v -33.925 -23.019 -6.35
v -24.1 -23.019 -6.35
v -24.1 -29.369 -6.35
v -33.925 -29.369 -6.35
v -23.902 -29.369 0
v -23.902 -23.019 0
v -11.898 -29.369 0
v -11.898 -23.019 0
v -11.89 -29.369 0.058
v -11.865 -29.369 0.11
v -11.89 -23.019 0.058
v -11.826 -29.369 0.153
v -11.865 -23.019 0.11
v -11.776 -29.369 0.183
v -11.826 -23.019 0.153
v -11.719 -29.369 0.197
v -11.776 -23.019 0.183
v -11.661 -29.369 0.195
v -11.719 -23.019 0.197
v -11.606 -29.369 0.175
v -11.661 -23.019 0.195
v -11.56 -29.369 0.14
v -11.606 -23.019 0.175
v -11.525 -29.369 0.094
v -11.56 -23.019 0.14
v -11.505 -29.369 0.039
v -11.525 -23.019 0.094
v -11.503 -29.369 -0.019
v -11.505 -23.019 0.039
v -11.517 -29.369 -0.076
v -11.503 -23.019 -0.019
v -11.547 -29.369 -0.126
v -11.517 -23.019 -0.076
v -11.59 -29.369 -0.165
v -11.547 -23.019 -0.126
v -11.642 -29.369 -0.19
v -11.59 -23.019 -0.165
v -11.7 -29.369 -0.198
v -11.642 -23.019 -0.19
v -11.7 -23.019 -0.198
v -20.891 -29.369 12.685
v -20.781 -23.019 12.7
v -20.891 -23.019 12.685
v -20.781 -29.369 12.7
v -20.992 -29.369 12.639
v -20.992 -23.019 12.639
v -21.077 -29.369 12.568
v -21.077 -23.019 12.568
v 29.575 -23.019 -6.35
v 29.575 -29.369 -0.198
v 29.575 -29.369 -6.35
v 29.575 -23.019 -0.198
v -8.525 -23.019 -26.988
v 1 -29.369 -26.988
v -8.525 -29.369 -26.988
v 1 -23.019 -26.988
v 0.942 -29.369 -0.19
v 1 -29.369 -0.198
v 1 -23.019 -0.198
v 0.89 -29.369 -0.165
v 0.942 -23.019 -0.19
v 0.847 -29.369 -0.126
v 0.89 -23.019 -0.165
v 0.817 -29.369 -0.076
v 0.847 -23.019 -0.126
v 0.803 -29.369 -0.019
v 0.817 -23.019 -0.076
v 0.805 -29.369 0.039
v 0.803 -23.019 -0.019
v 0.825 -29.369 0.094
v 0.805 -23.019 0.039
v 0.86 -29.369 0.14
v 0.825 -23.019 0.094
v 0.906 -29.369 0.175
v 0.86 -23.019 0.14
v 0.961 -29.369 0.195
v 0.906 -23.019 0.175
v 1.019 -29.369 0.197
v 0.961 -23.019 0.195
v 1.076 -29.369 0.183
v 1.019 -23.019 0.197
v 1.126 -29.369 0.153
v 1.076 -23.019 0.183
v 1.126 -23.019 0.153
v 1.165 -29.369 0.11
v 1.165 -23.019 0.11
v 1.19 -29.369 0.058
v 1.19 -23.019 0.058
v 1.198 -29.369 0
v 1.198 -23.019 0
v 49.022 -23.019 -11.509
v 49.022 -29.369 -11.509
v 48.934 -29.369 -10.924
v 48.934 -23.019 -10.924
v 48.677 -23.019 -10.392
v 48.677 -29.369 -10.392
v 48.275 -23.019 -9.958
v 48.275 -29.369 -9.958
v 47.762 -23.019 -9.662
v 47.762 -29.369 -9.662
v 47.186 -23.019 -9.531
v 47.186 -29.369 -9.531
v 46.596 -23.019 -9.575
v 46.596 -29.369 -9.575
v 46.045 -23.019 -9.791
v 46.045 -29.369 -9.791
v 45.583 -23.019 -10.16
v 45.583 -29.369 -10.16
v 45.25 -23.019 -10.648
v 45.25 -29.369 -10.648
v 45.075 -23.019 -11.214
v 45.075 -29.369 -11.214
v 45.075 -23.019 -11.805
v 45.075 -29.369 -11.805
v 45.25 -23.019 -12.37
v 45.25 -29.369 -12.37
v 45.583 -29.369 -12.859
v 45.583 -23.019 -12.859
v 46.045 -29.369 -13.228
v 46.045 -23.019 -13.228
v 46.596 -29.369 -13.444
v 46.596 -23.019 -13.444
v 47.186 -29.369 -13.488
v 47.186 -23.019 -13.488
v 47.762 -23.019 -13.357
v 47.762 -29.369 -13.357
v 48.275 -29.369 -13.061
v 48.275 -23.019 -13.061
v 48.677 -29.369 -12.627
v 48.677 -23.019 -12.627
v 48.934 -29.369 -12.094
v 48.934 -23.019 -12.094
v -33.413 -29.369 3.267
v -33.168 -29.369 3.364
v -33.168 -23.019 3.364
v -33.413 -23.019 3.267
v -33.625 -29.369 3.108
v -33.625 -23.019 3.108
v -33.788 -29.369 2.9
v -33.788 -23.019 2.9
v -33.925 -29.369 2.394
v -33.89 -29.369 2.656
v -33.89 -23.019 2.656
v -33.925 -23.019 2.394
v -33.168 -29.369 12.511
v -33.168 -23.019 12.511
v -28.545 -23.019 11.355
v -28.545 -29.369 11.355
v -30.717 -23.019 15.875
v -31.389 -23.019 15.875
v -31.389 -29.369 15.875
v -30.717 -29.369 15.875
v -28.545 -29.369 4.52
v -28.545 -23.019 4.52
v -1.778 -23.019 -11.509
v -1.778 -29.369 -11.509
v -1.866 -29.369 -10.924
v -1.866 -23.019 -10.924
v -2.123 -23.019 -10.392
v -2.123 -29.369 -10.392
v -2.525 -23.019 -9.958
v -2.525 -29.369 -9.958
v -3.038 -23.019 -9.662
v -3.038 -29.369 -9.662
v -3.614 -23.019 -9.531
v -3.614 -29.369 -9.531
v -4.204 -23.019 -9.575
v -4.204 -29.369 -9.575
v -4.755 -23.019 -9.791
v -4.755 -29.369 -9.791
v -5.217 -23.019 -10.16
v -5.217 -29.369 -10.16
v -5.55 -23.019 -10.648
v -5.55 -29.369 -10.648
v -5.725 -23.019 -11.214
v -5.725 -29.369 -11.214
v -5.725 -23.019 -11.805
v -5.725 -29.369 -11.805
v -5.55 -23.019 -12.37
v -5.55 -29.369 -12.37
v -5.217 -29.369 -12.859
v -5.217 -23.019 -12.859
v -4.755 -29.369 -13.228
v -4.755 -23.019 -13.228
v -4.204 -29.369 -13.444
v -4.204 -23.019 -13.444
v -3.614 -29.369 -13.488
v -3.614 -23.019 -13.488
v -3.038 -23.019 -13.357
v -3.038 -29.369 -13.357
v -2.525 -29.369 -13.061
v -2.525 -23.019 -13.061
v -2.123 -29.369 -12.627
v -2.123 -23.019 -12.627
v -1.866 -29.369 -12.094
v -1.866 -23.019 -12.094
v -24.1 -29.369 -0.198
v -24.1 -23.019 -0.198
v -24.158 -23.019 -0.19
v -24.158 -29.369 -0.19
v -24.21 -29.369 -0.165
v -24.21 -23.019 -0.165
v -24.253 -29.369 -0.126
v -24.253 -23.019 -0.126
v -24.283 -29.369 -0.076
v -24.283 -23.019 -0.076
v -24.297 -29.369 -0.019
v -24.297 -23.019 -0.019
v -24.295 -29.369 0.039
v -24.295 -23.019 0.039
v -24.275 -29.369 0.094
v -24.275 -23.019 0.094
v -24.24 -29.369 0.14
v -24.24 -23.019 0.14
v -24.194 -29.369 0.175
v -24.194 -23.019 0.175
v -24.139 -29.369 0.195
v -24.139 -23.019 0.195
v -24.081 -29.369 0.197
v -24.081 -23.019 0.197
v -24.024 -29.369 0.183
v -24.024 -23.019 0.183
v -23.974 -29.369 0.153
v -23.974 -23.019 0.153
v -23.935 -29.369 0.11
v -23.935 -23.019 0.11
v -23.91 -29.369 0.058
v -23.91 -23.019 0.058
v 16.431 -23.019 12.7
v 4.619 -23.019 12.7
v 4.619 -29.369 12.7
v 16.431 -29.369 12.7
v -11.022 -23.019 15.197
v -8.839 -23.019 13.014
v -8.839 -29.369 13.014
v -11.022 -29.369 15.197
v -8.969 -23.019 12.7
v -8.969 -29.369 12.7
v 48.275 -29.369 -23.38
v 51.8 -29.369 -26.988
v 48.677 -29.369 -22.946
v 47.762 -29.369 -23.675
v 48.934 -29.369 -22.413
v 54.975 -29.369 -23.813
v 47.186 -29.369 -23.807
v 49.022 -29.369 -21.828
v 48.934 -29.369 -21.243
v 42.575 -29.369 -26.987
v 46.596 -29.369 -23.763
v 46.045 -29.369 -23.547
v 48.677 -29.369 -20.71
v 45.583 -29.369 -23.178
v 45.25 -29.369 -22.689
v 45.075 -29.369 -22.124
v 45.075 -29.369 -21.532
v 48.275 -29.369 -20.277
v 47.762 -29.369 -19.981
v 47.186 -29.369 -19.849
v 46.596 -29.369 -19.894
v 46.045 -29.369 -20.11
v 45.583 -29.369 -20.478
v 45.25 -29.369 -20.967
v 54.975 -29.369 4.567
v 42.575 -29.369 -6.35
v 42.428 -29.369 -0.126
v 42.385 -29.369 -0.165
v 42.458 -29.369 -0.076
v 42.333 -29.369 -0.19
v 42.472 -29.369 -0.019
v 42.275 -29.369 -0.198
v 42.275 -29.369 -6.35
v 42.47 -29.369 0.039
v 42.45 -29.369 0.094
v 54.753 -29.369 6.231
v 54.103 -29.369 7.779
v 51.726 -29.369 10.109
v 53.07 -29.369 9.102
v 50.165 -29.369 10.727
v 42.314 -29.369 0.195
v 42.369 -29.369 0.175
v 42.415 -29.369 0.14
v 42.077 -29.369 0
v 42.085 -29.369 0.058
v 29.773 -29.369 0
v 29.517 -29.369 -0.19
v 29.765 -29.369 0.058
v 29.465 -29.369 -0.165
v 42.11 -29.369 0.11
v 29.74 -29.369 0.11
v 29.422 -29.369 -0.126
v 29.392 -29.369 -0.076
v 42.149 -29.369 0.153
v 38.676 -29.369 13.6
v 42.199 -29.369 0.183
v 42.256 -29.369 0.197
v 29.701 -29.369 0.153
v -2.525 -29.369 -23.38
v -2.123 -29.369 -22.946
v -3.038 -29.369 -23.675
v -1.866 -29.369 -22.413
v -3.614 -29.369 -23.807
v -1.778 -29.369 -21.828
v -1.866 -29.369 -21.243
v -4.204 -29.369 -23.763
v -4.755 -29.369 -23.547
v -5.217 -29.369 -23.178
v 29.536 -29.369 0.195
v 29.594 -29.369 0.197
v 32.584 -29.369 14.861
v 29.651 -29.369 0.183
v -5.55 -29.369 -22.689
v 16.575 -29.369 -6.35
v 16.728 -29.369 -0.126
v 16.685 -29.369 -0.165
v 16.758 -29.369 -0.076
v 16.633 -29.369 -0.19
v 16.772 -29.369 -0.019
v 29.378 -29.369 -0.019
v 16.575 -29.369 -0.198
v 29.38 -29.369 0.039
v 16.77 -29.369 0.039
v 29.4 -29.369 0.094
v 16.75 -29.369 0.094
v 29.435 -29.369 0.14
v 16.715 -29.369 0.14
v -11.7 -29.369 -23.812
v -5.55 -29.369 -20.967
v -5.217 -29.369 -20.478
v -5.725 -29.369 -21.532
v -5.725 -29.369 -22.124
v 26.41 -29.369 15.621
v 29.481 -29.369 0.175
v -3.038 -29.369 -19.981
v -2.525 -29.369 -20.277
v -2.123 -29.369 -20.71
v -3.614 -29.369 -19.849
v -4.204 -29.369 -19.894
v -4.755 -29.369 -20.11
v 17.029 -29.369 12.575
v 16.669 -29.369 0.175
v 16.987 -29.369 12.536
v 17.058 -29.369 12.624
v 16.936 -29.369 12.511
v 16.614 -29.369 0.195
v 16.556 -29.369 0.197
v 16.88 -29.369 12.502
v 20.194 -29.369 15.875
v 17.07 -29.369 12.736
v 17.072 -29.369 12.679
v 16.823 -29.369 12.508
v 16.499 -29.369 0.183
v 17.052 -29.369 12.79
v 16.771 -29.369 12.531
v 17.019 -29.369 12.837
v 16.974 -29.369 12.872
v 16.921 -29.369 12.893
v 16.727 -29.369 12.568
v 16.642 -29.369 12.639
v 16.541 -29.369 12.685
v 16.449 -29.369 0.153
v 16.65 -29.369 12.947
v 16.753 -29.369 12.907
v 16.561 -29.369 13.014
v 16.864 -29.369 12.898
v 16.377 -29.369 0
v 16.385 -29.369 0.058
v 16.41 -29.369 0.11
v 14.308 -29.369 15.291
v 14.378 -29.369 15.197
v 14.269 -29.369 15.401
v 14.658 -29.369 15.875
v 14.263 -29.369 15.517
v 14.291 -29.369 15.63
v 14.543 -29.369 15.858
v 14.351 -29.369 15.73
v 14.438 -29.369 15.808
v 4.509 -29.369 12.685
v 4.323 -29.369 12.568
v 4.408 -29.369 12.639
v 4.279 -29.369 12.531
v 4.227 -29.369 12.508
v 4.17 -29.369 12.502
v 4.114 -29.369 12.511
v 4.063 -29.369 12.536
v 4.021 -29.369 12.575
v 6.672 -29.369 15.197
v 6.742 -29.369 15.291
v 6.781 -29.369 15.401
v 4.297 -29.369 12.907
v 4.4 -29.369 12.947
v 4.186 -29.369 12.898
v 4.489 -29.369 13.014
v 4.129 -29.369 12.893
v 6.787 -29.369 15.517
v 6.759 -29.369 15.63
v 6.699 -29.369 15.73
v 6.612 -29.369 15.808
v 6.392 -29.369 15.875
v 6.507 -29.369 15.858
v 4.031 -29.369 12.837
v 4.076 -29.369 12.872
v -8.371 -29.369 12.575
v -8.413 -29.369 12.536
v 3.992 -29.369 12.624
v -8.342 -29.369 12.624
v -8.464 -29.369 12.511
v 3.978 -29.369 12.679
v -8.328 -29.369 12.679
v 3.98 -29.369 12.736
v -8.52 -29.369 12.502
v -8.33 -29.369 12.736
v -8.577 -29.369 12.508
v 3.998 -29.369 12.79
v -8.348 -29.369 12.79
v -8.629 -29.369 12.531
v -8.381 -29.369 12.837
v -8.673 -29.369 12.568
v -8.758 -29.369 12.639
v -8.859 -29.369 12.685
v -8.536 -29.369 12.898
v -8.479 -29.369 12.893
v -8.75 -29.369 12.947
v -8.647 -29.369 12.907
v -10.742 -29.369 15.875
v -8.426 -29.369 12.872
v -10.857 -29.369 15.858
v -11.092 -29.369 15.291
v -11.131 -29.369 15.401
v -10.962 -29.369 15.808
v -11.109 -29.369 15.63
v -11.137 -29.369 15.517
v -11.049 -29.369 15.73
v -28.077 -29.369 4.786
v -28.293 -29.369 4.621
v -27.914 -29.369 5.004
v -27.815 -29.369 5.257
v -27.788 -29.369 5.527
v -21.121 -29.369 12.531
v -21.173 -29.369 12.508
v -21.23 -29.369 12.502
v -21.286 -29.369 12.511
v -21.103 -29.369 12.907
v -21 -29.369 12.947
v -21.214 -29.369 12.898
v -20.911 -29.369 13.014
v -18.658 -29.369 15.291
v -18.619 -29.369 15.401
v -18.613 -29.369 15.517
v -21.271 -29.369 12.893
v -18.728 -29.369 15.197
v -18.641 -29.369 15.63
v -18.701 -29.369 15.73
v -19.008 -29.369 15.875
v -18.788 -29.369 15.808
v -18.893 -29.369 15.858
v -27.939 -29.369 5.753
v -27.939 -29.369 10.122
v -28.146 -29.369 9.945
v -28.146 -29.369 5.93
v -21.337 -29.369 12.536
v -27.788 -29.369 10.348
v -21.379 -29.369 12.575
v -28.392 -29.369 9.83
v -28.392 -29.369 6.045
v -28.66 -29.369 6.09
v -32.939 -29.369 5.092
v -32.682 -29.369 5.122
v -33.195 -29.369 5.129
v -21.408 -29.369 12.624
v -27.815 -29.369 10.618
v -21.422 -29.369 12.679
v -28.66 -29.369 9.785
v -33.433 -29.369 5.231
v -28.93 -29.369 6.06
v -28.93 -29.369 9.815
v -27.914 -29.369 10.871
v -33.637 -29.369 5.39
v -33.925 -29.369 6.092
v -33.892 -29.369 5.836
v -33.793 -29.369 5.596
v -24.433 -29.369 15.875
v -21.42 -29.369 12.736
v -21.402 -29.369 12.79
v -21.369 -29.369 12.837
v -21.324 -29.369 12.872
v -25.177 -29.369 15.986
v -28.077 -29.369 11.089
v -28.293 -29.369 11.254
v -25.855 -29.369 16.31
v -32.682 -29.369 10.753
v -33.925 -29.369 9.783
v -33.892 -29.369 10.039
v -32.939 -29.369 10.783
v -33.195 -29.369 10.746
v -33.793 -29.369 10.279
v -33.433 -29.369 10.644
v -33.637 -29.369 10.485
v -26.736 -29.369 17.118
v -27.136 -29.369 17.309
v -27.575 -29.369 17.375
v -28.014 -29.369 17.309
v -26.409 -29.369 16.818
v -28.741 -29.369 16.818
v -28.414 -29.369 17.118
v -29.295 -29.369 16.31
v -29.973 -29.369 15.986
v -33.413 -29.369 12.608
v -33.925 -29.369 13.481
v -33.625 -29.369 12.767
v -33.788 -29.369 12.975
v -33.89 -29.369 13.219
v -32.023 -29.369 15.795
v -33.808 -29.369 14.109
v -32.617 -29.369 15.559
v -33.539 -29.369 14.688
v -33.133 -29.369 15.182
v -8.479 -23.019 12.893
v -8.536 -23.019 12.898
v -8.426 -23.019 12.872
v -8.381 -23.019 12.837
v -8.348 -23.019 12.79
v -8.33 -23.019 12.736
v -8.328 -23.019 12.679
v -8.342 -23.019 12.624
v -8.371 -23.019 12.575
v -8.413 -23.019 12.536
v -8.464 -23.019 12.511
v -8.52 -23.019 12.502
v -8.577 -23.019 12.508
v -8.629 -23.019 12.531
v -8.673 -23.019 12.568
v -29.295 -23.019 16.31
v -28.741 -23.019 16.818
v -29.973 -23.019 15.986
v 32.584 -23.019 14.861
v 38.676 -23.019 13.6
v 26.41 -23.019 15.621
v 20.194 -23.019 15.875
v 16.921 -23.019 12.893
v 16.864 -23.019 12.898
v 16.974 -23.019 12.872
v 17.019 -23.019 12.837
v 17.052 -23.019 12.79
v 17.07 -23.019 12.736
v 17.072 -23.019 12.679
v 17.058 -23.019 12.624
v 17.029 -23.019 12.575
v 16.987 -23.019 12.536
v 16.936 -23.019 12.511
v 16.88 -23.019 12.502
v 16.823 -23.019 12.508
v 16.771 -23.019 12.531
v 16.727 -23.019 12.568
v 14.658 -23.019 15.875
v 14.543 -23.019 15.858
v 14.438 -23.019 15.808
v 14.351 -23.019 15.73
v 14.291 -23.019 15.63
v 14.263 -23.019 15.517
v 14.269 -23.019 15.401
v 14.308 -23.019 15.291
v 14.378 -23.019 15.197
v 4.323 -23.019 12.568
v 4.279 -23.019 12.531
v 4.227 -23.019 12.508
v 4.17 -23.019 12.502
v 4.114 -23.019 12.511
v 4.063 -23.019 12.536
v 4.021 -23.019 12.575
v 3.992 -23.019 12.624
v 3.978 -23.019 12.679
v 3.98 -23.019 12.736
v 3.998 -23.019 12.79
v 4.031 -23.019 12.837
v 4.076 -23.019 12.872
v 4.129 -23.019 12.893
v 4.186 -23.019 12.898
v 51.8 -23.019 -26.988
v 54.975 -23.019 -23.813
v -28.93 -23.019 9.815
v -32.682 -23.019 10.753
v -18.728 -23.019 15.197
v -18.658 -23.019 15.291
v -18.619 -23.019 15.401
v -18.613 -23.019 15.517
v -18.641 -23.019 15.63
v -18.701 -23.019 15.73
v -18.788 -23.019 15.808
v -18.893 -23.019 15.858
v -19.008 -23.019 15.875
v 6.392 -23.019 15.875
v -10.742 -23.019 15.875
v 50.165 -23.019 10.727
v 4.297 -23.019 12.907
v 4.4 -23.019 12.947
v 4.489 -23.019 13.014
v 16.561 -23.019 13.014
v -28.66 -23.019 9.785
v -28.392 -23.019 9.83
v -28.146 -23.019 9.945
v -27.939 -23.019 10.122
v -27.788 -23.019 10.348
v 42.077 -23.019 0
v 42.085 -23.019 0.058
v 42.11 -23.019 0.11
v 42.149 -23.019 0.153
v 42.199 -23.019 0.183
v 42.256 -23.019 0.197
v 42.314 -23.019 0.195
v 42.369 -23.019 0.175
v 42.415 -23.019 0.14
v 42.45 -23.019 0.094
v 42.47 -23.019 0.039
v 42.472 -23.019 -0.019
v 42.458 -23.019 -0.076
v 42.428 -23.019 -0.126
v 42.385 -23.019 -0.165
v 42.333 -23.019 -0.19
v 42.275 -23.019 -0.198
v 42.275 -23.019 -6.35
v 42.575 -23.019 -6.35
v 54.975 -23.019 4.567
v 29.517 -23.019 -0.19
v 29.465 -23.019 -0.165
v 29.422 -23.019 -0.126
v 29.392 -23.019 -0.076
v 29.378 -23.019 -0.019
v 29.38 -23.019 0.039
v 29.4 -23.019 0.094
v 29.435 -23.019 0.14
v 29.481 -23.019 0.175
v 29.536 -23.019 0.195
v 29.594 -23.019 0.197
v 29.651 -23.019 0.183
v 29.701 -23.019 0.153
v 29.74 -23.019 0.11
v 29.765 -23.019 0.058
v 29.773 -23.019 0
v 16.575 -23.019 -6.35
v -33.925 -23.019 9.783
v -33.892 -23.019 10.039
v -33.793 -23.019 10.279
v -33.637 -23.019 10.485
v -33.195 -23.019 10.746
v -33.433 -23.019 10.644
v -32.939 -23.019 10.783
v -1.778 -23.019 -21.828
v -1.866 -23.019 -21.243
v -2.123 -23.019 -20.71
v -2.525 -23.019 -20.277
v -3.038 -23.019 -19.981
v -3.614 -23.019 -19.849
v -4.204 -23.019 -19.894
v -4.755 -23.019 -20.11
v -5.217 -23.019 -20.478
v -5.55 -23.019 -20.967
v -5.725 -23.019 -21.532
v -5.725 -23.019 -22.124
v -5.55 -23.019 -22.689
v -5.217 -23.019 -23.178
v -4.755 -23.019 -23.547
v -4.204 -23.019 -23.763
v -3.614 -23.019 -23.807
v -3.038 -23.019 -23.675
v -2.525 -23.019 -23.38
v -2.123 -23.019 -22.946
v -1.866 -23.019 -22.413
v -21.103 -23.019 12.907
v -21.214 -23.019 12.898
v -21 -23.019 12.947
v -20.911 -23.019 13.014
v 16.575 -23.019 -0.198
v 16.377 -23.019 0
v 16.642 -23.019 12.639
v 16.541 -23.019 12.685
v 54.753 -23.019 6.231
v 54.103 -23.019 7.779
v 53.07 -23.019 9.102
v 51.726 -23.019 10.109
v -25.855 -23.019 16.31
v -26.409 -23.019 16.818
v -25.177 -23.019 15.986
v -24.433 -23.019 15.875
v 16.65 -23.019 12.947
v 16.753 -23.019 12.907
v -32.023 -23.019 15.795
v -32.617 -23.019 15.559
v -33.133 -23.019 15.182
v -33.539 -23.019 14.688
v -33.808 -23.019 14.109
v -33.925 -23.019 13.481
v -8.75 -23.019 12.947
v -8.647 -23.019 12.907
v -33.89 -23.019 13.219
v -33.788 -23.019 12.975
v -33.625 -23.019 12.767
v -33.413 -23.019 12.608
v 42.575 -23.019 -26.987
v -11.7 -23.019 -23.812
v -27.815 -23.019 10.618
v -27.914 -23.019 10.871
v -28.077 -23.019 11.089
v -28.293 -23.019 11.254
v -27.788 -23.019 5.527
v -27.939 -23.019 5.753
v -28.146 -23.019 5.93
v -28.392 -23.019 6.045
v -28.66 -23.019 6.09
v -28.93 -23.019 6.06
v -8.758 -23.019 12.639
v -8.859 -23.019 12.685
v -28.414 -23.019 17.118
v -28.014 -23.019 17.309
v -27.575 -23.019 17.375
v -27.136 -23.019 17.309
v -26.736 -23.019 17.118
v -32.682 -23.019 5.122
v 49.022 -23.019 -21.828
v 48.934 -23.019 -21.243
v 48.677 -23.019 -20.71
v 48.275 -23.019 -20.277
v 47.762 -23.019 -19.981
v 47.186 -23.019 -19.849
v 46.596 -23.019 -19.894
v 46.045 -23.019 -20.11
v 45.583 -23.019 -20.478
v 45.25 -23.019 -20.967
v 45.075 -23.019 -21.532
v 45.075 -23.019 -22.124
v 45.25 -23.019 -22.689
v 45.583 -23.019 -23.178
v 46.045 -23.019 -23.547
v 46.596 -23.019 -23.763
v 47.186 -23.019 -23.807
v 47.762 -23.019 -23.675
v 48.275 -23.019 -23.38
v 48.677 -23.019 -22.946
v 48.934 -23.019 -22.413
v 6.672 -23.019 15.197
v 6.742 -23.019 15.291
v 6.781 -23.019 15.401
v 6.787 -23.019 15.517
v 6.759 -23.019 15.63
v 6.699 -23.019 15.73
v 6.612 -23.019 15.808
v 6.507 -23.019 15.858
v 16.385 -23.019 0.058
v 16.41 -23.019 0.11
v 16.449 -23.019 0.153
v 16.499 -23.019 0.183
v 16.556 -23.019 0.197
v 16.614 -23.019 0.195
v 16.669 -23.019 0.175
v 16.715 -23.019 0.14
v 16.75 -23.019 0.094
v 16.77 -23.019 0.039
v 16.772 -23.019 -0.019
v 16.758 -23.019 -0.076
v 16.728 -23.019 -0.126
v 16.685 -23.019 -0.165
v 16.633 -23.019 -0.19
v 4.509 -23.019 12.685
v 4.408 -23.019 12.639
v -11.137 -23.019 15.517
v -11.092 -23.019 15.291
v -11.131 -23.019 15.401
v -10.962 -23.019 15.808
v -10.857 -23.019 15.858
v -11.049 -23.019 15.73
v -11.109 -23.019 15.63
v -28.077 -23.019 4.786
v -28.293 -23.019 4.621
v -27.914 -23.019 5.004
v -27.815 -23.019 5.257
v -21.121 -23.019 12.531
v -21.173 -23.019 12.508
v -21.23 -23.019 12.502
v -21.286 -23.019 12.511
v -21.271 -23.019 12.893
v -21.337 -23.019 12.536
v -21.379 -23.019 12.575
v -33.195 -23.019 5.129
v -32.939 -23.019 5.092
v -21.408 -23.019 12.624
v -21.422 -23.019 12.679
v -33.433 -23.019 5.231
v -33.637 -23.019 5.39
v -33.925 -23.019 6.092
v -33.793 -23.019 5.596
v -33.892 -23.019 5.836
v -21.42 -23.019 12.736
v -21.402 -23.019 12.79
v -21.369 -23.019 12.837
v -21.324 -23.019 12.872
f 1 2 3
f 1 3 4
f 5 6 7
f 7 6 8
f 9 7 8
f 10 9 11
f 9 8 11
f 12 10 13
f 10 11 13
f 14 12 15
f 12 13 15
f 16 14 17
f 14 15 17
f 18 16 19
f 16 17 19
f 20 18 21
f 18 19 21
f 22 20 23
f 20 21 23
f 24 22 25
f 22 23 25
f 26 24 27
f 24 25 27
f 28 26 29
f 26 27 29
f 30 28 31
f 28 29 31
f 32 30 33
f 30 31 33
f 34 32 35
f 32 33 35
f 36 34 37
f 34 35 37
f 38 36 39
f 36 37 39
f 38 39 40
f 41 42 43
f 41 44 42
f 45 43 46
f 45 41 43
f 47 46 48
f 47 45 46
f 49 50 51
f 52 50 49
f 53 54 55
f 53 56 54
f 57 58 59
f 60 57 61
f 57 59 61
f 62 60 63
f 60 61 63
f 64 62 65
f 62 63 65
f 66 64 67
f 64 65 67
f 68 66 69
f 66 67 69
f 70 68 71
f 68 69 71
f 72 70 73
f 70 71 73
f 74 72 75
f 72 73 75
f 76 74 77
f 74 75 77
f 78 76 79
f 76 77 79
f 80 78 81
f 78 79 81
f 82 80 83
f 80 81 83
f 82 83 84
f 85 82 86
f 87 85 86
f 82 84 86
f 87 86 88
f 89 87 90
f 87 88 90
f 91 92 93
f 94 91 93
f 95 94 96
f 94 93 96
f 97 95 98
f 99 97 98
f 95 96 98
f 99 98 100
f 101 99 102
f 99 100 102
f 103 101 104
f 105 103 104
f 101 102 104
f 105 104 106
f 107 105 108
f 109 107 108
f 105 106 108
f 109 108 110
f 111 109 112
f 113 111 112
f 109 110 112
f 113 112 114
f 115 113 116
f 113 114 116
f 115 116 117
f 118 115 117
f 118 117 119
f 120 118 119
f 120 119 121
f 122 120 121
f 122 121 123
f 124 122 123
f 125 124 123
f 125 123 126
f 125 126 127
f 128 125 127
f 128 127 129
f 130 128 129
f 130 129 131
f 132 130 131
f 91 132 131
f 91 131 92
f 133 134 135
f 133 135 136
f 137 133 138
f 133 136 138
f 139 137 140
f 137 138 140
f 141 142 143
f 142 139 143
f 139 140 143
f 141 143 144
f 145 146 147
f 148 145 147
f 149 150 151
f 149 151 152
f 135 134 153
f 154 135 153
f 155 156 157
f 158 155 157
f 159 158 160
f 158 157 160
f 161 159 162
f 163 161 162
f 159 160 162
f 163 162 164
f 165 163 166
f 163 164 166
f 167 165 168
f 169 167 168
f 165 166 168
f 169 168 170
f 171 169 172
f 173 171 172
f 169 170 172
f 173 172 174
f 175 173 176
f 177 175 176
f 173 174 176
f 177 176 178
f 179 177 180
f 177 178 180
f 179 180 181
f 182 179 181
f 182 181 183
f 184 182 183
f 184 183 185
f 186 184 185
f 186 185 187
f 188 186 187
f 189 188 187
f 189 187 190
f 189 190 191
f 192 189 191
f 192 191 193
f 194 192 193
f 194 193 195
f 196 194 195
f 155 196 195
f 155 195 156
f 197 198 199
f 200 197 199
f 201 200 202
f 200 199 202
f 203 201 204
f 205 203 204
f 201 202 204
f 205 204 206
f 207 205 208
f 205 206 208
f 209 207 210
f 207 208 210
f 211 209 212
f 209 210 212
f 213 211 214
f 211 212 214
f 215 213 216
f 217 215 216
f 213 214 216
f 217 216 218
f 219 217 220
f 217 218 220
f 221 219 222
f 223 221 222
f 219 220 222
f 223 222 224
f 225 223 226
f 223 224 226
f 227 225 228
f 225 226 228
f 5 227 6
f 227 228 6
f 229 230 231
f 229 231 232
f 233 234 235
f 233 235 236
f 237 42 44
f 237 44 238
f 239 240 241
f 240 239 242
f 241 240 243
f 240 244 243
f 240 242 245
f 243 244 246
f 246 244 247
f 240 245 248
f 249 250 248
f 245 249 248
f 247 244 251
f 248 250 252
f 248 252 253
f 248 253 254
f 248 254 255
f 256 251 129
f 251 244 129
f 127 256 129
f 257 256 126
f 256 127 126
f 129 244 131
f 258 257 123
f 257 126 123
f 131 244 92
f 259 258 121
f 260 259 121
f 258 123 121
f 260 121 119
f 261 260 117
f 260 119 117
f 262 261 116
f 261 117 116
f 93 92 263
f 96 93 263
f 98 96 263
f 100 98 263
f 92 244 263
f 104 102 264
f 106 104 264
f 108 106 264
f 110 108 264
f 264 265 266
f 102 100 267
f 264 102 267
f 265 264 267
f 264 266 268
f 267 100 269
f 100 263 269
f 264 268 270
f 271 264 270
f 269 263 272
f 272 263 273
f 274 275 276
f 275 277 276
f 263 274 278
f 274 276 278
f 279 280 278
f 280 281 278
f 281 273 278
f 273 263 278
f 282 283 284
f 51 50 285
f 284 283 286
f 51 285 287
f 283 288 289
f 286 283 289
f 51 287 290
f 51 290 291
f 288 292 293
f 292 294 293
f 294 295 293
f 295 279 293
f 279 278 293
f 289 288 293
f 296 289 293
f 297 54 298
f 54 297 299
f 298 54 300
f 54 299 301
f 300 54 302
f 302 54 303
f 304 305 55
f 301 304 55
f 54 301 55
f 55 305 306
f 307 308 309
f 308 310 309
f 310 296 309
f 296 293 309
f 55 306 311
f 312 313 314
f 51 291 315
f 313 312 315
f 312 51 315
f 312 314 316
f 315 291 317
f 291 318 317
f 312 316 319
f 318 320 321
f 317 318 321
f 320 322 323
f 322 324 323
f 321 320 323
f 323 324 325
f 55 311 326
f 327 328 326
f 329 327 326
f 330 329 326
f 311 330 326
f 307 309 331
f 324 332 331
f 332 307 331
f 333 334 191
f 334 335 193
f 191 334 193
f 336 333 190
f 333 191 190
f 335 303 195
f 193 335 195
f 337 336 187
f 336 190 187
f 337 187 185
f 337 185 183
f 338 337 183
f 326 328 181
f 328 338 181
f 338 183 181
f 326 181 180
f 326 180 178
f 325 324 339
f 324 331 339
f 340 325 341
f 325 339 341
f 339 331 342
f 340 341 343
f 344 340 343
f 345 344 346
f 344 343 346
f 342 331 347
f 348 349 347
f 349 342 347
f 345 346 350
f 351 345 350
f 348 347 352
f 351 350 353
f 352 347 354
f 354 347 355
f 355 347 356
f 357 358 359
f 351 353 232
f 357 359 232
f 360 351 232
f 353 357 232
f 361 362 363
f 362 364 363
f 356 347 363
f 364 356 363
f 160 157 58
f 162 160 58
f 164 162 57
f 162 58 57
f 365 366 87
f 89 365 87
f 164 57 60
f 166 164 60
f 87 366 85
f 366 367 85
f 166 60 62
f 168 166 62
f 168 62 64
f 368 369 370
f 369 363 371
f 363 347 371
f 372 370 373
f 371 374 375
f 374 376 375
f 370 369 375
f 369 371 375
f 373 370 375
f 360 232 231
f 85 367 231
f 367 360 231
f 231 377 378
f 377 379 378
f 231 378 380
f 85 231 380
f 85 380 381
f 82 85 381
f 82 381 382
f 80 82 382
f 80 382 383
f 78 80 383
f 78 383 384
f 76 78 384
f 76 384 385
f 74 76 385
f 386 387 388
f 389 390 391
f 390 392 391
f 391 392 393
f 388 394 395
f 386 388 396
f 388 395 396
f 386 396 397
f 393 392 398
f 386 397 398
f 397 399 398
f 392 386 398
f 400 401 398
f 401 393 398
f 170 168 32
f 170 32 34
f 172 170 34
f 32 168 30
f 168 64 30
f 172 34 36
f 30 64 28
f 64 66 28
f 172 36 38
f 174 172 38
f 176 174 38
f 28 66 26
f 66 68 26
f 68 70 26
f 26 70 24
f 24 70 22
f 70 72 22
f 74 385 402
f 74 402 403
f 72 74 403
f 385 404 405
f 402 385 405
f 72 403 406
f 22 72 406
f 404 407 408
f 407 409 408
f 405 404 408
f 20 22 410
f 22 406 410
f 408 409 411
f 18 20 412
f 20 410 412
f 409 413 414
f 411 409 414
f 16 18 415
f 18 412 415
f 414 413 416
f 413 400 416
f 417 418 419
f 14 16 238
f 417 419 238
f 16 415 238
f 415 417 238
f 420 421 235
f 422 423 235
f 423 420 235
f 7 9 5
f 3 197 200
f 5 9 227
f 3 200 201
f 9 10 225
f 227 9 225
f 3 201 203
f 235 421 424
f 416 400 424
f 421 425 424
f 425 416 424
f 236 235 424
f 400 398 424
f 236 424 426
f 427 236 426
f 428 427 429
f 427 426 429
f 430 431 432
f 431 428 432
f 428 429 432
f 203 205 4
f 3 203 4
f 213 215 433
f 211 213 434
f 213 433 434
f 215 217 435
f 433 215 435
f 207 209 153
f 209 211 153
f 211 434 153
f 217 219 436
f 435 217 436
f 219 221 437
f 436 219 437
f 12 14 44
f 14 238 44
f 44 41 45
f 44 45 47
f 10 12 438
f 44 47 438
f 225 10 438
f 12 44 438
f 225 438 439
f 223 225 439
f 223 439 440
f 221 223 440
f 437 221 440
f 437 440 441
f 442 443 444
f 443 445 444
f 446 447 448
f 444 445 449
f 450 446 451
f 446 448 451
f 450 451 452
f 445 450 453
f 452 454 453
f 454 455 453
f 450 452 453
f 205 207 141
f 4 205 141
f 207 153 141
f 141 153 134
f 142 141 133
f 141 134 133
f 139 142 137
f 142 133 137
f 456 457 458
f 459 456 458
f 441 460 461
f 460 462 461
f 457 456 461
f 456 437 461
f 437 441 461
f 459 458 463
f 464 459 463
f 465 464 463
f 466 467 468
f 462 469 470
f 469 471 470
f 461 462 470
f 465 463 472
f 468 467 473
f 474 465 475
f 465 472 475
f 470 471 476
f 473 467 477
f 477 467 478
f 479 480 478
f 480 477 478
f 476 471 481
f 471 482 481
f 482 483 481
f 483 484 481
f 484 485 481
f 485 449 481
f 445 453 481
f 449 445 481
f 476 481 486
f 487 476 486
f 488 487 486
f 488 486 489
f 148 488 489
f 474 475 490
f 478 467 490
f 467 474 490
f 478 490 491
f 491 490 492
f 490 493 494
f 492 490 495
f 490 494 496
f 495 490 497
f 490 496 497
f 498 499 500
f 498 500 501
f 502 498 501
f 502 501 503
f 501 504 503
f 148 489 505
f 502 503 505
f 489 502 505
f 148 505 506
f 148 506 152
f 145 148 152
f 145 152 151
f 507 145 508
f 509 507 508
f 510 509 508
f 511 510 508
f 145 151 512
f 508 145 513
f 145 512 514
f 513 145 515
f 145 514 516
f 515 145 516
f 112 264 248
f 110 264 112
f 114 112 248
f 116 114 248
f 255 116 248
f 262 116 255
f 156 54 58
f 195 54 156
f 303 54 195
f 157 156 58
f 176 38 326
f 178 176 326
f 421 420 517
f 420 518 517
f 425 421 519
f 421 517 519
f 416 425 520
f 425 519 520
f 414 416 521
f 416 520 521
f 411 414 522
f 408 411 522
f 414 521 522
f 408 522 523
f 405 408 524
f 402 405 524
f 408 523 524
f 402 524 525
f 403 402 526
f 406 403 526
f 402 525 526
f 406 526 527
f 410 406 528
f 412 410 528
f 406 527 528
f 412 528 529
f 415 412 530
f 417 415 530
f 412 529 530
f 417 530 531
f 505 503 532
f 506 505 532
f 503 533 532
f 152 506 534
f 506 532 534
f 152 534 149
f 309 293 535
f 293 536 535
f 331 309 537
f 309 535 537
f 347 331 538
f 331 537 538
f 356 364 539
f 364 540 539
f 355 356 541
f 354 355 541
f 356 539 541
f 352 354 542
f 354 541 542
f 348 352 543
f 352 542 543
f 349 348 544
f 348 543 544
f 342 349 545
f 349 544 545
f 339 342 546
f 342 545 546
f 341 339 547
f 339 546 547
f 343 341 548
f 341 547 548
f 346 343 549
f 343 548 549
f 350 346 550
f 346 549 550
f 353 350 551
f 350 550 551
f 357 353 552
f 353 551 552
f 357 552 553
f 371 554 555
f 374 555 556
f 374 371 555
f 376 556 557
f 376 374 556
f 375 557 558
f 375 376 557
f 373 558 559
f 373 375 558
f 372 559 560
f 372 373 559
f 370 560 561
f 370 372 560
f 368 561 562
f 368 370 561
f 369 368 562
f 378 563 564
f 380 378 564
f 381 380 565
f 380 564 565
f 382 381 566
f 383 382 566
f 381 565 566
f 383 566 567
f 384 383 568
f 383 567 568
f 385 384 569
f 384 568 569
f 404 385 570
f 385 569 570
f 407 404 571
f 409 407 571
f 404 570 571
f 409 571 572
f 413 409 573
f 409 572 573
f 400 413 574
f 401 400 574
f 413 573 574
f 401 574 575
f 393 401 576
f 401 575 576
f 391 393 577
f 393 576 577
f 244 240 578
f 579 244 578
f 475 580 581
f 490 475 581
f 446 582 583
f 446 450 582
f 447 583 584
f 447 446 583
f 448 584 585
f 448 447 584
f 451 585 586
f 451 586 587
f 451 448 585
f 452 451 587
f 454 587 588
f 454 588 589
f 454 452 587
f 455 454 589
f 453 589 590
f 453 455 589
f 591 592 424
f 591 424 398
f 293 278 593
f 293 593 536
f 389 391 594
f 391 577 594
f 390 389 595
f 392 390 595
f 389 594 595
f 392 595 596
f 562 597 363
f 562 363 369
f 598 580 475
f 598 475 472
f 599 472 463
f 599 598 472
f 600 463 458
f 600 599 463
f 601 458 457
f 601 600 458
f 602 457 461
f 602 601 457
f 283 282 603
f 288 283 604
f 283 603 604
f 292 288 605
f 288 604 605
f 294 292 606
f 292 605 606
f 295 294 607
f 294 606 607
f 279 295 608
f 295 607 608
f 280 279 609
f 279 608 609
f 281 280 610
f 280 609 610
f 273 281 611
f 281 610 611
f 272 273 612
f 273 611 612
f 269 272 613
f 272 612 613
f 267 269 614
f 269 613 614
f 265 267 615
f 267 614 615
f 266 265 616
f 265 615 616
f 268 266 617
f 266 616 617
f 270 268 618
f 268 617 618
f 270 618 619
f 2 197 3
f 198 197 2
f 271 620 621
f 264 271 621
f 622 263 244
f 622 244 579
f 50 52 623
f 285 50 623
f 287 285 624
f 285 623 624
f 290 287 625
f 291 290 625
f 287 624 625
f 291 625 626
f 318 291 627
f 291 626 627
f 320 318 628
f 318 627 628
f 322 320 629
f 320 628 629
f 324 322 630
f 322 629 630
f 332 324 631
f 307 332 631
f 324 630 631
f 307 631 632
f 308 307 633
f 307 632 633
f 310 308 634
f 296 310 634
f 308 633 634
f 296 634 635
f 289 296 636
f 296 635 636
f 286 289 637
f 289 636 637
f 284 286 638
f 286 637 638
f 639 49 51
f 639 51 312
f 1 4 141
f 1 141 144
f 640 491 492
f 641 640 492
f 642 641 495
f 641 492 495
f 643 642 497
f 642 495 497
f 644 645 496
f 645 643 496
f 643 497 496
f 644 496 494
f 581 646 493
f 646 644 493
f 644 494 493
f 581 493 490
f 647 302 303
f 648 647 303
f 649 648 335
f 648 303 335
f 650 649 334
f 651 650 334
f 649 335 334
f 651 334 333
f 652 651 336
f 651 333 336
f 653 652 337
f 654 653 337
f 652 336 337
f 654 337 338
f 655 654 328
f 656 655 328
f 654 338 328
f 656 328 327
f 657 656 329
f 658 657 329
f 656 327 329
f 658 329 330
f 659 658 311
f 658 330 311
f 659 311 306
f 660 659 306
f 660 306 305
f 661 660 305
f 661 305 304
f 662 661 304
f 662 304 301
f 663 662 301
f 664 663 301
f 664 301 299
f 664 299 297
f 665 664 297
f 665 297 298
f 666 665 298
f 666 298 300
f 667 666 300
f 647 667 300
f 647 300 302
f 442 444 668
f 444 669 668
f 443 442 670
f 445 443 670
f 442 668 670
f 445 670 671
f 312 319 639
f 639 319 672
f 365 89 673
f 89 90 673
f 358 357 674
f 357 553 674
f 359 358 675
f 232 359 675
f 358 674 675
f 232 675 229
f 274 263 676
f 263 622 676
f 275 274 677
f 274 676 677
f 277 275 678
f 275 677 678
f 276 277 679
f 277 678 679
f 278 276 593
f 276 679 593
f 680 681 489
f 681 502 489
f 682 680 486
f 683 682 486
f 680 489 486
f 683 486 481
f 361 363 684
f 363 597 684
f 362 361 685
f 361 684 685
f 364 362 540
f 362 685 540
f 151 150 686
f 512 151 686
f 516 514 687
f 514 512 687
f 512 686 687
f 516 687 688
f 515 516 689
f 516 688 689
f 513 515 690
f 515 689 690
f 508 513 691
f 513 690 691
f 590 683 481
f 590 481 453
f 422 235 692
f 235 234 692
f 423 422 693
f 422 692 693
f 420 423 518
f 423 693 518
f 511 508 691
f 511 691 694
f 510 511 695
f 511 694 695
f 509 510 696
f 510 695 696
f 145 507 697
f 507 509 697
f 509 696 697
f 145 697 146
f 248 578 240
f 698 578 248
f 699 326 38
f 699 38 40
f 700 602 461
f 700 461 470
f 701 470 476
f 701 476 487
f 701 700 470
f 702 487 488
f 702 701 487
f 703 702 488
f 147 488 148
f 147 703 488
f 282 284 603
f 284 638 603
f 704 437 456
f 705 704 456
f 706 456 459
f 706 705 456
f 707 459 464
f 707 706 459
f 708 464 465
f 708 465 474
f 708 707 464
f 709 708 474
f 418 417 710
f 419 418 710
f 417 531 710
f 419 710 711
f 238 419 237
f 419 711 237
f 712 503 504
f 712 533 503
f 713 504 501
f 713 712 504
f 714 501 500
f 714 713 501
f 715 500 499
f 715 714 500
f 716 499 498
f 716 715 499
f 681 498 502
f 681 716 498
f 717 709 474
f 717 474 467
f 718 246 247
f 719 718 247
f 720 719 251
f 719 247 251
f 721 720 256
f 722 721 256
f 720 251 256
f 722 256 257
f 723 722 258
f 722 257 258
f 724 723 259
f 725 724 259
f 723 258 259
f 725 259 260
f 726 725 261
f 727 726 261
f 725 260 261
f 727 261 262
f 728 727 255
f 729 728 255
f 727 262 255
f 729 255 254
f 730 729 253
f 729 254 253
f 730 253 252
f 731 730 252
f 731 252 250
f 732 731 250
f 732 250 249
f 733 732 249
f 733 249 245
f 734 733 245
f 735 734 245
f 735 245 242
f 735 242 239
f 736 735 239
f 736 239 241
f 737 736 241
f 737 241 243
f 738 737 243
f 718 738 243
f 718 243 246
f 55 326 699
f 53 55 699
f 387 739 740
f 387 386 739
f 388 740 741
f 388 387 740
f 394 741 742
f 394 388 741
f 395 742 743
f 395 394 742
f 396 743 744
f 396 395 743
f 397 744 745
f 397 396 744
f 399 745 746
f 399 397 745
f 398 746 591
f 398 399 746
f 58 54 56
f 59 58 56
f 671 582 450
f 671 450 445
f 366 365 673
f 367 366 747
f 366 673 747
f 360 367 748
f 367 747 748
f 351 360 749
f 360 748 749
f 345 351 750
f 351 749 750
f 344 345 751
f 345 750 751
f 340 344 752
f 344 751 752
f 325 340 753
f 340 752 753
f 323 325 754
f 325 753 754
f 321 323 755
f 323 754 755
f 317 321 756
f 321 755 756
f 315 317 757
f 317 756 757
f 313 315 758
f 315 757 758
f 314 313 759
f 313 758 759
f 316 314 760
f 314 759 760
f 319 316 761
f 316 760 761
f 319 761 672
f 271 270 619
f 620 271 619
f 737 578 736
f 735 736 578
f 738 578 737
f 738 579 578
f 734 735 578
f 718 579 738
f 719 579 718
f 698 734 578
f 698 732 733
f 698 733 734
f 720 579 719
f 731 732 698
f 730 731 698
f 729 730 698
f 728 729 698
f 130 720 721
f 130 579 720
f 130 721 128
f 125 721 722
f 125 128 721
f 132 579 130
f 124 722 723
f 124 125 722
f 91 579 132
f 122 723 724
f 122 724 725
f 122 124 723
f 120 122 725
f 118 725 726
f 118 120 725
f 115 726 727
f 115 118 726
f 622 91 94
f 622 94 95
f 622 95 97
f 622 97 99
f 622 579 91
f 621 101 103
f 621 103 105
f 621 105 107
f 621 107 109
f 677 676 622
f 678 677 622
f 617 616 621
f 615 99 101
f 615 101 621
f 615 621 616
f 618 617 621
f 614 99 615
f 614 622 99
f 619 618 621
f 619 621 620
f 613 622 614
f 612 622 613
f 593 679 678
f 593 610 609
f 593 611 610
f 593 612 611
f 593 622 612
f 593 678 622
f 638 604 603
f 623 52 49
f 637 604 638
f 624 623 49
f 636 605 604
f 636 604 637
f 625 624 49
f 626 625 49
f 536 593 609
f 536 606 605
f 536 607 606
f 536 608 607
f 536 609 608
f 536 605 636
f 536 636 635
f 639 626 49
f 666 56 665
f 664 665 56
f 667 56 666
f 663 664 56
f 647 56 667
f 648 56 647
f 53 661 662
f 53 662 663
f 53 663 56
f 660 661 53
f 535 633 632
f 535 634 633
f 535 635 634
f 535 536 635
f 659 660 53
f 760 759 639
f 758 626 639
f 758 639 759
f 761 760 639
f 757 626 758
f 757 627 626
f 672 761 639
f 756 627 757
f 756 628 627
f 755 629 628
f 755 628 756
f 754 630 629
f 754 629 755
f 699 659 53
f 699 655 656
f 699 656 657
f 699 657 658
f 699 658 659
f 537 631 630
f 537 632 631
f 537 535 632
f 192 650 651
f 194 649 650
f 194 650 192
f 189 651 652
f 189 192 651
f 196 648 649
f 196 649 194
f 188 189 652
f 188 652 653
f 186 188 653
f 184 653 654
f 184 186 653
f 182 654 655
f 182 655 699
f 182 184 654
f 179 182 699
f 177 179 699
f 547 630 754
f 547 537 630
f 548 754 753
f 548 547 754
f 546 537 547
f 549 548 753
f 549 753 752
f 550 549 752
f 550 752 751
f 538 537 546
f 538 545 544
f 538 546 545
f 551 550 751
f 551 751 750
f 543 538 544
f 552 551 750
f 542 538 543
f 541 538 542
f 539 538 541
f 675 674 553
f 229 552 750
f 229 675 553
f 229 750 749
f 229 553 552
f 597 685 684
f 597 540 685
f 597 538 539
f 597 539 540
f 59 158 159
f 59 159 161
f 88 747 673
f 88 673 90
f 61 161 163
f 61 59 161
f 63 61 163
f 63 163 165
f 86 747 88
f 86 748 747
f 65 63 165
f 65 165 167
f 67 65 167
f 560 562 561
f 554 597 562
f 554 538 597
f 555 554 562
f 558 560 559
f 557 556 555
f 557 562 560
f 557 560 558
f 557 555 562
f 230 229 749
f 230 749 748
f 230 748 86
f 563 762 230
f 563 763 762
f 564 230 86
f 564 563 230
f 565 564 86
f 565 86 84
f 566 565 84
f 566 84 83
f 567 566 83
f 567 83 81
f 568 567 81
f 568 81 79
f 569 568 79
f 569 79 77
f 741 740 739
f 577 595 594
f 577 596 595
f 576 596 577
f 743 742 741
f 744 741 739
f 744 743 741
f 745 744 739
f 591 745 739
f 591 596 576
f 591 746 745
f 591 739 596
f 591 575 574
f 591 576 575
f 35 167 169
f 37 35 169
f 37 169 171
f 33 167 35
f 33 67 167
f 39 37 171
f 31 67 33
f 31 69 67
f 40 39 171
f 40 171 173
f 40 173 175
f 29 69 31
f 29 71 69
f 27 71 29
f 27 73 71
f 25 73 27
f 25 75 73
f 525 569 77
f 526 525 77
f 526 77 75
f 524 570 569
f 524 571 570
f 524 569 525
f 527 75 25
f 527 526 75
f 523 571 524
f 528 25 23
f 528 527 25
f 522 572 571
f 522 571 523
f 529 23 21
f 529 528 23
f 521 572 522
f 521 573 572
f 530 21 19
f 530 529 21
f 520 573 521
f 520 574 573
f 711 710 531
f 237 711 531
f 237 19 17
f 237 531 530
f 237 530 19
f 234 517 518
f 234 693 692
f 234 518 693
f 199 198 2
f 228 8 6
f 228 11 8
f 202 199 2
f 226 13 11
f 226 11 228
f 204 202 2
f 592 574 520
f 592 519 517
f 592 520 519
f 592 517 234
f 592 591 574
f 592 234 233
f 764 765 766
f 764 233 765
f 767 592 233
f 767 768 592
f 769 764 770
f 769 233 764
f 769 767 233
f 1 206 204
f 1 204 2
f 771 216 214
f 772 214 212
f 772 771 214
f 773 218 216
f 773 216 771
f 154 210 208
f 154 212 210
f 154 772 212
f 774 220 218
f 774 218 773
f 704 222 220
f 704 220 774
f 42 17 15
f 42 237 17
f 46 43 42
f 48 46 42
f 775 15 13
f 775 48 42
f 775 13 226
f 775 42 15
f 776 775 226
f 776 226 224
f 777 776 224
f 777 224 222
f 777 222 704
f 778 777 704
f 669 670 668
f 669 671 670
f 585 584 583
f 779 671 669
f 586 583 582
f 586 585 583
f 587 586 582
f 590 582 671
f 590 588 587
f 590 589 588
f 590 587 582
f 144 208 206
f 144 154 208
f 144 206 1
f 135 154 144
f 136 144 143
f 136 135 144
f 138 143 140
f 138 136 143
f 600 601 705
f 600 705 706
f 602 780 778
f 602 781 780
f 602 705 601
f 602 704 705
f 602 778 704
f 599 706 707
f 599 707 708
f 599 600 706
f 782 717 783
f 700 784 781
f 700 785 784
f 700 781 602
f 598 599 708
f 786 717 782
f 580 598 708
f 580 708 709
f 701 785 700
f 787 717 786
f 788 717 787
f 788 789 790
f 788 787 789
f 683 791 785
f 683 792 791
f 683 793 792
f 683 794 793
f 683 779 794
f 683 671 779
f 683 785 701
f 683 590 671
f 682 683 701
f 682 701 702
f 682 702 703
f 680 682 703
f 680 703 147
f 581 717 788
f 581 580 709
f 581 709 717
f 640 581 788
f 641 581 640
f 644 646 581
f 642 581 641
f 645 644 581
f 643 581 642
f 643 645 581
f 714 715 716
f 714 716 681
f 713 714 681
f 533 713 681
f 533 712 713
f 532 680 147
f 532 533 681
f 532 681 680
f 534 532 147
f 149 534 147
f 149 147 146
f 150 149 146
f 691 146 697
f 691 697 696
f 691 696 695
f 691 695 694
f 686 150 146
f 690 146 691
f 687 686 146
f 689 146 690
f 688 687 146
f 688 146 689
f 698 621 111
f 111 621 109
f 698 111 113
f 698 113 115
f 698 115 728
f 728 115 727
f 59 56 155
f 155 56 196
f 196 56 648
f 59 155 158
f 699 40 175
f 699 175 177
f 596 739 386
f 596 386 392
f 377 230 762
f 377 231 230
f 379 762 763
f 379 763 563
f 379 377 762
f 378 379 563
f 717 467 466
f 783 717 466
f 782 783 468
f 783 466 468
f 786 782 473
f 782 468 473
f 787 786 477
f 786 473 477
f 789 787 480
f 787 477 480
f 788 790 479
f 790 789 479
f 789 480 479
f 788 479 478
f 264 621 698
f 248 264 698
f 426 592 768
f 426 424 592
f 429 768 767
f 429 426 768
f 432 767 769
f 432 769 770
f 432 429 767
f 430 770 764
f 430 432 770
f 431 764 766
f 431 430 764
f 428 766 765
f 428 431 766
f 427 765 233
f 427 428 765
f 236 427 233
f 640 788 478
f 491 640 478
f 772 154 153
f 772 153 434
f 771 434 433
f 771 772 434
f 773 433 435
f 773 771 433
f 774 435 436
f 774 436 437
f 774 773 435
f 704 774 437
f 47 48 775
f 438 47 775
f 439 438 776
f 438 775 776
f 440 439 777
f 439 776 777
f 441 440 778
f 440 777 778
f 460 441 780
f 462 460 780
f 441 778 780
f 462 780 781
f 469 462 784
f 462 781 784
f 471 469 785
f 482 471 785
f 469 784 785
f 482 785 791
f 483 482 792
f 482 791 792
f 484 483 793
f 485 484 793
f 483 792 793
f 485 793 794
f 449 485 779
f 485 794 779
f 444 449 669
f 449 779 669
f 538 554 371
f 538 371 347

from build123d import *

# Parameters (mm, degrees)
BOSS_EXTRUDE1_DEPTH = 15.875
SKETCH3_W           = 12.7
SKETCH3_H           = 6.35
BOSS_EXTRUDE2_DEPTH = 26.9875
SKETCH5_R           = 1.5
BOSS_EXTRUDE4_DEPTH = 6.35
FILLET1_R           = 2.54
CUT_EXTRUDE1_DEPTH  = 62.570271083
FILLET3_R           = 1
CUT_EXTRUDE2_DEPTH  = 6.35
FILLET4_R           = 6.35
FILLET5_R           = 76.2
SKETCH8_W           = 9.825
SKETCH8_H           = 6.35
BOSS_EXTRUDE5_DEPTH = 6.35
SKETCH9_W           = 0.299999908
SKETCH9_H           = 20.6375
CUT_EXTRUDE3_DEPTH  = 62.570271083
FILLET6_R           = 2.54
FILLET7_R           = 2.54
SKETCH10_R          = 1.984375
CUT_EXTRUDE4_DEPTH  = 62.570271083
CHAMFER1_SIZE       = 3.175
SKETCH11_W          = 13
SKETCH11_H          = 6.35
BOSS_EXTRUDE6_DEPTH = 6.35
SKETCH12_R          = 0.1984375
CUT_EXTRUDE5_DEPTH  = 62.570271083
CUT_EXTRUDE6_DEPTH  = 6.35
FILLET8_R           = 0.396875
SKETCH14_R          = 0.1984375
CUT_EXTRUDE7_DEPTH  = 62.570271083
FILLET9_R           = 0.396875


with BuildPart() as part:
    # Sketch2 → Boss-Extrude1 (new body)
    with BuildSketch(Plane.XY):
        Polygon((51.8, -23.01875), (-33.925, -23.01875), (-33.925, -29.36875), (48.625, -29.36875), (54.975, -29.36875), (54.975, -23.01875), align=None)
    extrude(amount=BOSS_EXTRUDE1_DEPTH)

    # Sketch3 → Boss-Extrude2 (add)
    with BuildSketch(Plane(origin=(0, 0, 0), x_dir=(-1, 0, 0), z_dir=(0, 0, -1))):
        with Locations((5.35, -26.19375)):
            Rectangle(SKETCH3_W, SKETCH3_H)
        with Locations((-48.625, -26.19375)):
            Rectangle(SKETCH3_W, SKETCH3_H)
    extrude(amount=BOSS_EXTRUDE2_DEPTH)

    # Sketch5 → Boss-Extrude4 (add)
    with BuildSketch(Plane(origin=(0, -23.01875, 0), x_dir=(1, 0, 0), z_dir=(0, 1, 0))):
        with Locations((-27.575, -15.875)):
            Circle(SKETCH5_R)
    extrude(amount=-BOSS_EXTRUDE4_DEPTH)

    # Fillet1
    fillet1_edges = [part.edges().sort_by_distance(p)[0] for p in [
        (-26.075, -26.19375, 15.875),
    ]]
    fillet(fillet1_edges, radius=FILLET1_R)

    # Sketch6 → Cut-Extrude1 (cut, through all)
    with BuildSketch(Plane(origin=(0, -23.01875, 0), x_dir=(1, 0, 0), z_dir=(0, 1, 0))):
        Polygon((-33.925, -3.175), (-27.575, -4.7625), (-27.960025305, -6.302601219), (-34.310025305, -4.715101219), align=None)
        Polygon((-33.925, -12.7), (-27.575, -11.1125), (-27.960025305, -9.572398781), (-34.310025305, -11.159898781), align=None)
    extrude(amount=-CUT_EXTRUDE1_DEPTH, mode=Mode.SUBTRACT)

    # Fillet3
    # the kernel refuses this fillet: 1 mm, written as the material it adds along each edge
    with BuildSketch(Plane(origin=(-27.575, -23.01875, 11.1125), x_dir=(-0.24253562503632964, 0, -0.9701425001453328), z_dir=(0, -1, 0)), Plane(origin=(-27.960025305, -23.01875, 9.572398781), x_dir=(-0.970142500145332, 0, 0.242535625036333), z_dir=(0, -1, 0)), Plane(origin=(-27.960025305, -23.01875, 6.302601219), x_dir=(0.24253562503633191, 0, -0.9701425001453321), z_dir=(0, -1, 0)), Plane(origin=(-27.575, -23.01875, 4.7625), x_dir=(-0.9701425001453318, 0, -0.24253562503633383), z_dir=(0, -1, 0))) as fillet3_piece_1:
        with BuildLine():
            CenterArc((FILLET3_R, -FILLET3_R), FILLET3_R, 90, 90)
            Line((0, -FILLET3_R), (0, 0))
            Line((0, 0), (FILLET3_R, 0))
        make_face()
    extrude(amount=6.35)
    # the kernel refuses this fillet: 1 mm, written as the material it takes off along each edge
    with BuildSketch(Plane(origin=(-33.925, -21.066808984, 3.175), x_dir=(0, 0, -1), z_dir=(0, -1, 0)), Plane(origin=(-33.925, -21.066808984, 12.7), x_dir=(0.9701425001453319, 0, -0.24253562503633297), z_dir=(0, -1, 0))) as fillet3_2_piece_1:
        with BuildLine():
            CenterArc((FILLET3_R * 0.780776406404, FILLET3_R), FILLET3_R, 194.036243468, 75.963756532)
            Line((-FILLET3_R * 0.189366093741, FILLET3_R * 0.757464374964), (0, 0))
            Line((0, 0), (FILLET3_R * 0.780776406404, 0))
        make_face()
    extrude(amount=10.253882032, mode=Mode.SUBTRACT)
    with BuildSketch(Plane(origin=(-33.925, -32.570691016, 4.811357545), x_dir=(0.9701425001453321, 0, 0.24253562503633233), z_dir=(0, 1, 0)), Plane(origin=(-33.925, -32.570691016, 11.063642455), x_dir=(0, 0, -1), z_dir=(0, 1, 0))) as fillet3_2_piece_2:
        with BuildLine():
            CenterArc((FILLET3_R * 1.2807764064, -FILLET3_R), FILLET3_R, 90, 104.036243468)
            Line((FILLET3_R * 0.310633906259, -FILLET3_R * 1.24253562504), (0, 0))
            Line((0, 0), (FILLET3_R * 1.2807764064, 0))
        make_face()
    extrude(amount=12.753882032, mode=Mode.SUBTRACT)

    # Sketch7 → Cut-Extrude2 (cut)
    with BuildSketch(Plane(origin=(0, -29.36875, 0), x_dir=(-1, 0, 0), z_dir=(0, -1, 0))):
        Polygon((-54.975, -15.875), (-54.975, -9.525), (-29.575, -15.875), align=None)
    extrude(amount=-CUT_EXTRUDE2_DEPTH, mode=Mode.SUBTRACT)

    # Fillet4
    fillet4_edges = [part.edges().sort_by_distance(p)[0] for p in [
        (54.975, -26.19375, 9.525),
    ]]
    fillet(fillet4_edges, radius=FILLET4_R)

    # Fillet5
    fillet5_edges = [part.edges().sort_by_distance(p)[0] for p in [
        (29.575, -26.19375, 15.875),
    ]]
    fillet(fillet5_edges, radius=FILLET5_R)

    # Sketch8 → Boss-Extrude5 (add)
    with BuildSketch(Plane(origin=(0, 0, 0), x_dir=(-1, 0, 0), z_dir=(0, 0, -1))):
        with Locations((29.0125, -26.19375)):
            Rectangle(SKETCH8_W, SKETCH8_H)
    extrude(amount=BOSS_EXTRUDE5_DEPTH)

    # Sketch9 → Cut-Extrude3 (cut, through all)
    with BuildSketch(Plane(origin=(0, -23.01875, 0), x_dir=(1, 0, 0), z_dir=(0, 1, 0))):
        with Locations((42.424999954, 16.66875)):
            Rectangle(SKETCH9_W, SKETCH9_H)
    extrude(amount=-CUT_EXTRUDE3_DEPTH, mode=Mode.SUBTRACT)

    # Fillet6
    fillet6_edges = [part.edges().sort_by_distance(p)[0] for p in [
        (-29.075, -26.19375, 15.875),
    ]]
    fillet(fillet6_edges, radius=FILLET6_R)

    # Fillet7
    # the kernel refuses this fillet: 2.54 mm, written as the material it takes off along each edge
    with BuildSketch(Plane(origin=(-33.925, -16.679216678, 15.875), x_dir=(1, 0, 0), z_dir=(0, -1, 0))) as fillet7_piece_1:
        with BuildLine():
            CenterArc((2.535813329, -2.54), FILLET7_R, 90, 86.709856328)
            Line((0, -2.394223594), (-0.050716267, -2.391308065))
            ThreePointArc((-0.050716267, -2.391308065), (-0.0508, -1.197111797), (-0.0508, 0))
            Line((-0.0508, 0), (0, 0.0508))
            Line((0, 0.0508), (2.535813329, 0.0508))
            Line((2.535813329, 0.0508), (2.535813329, 0))
        make_face()
    extrude(amount=19.029066645, mode=Mode.SUBTRACT)

    # Sketch10 → Cut-Extrude4 (cut, through all)
    with BuildSketch(Plane(origin=(0, -29.36875, 0), x_dir=(-1, 0, 0), z_dir=(0, -1, 0))):
        with Locations(Location((-47.0375, 21.828125, 0), (0, 0, 180))):
            Circle(SKETCH10_R)
        with Locations(Location((-47.0375, 11.509375, 0), (0, 0, 180))):
            Circle(SKETCH10_R)
        with Locations(Location((3.7625, 11.509375, 0), (0, 0, 180))):
            Circle(SKETCH10_R)
        with Locations(Location((3.7625, 21.828125, 0), (0, 0, 180))):
            Circle(SKETCH10_R)
    extrude(amount=-CUT_EXTRUDE4_DEPTH, mode=Mode.SUBTRACT)

    # Chamfer1
    chamfer1_edges = [part.edges().sort_by_distance(p)[0] for p in [
        (54.975, -26.19375, -26.9875),
        (-11.7, -26.19375, -26.9875),
    ]]
    chamfer(chamfer1_edges, length=CHAMFER1_SIZE)

    # Sketch11 → Boss-Extrude6 (add)
    with BuildSketch(Plane(origin=(0, 0, 0), x_dir=(-1, 0, 0), z_dir=(0, 0, -1))):
        with Locations((-23.075, -26.19375)):
            Rectangle(SKETCH11_W, SKETCH11_H)
    extrude(amount=BOSS_EXTRUDE6_DEPTH)

    # Sketch12 → Cut-Extrude5 (cut, through all)
    with BuildSketch(Plane(origin=(0, -23.01875, 0), x_dir=(1, 0, 0), z_dir=(0, 1, 0))):
        with Locations((-24.1, 0)):
            Circle(SKETCH12_R)
        with Locations((-11.7, 0)):
            Circle(SKETCH12_R)
        with Locations((1, 0)):
            Circle(SKETCH12_R)
        with Locations((16.575, 0)):
            Circle(SKETCH12_R)
        with Locations((29.575, 0)):
            Circle(SKETCH12_R)
        with Locations((42.275, 0)):
            Circle(SKETCH12_R)
    extrude(amount=-CUT_EXTRUDE5_DEPTH, mode=Mode.SUBTRACT)

    # Sketch13 → Cut-Extrude6 (cut)
    with BuildSketch(Plane(origin=(0, -23.01875, 0), x_dir=(1, 0, 0), z_dir=(0, 1, 0))):
        Polygon((-21.225, -12.7), (-8.525, -12.7), (-11.7, -15.875), (-18.05, -15.875), align=None)
        Polygon((16.875, -12.7), (13.7, -15.875), (7.35, -15.875), (4.175, -12.7), align=None)
    extrude(amount=-CUT_EXTRUDE6_DEPTH, mode=Mode.SUBTRACT)

    # Fillet8
    fillet8_edges = [part.edges().sort_by_distance(p)[0] for p in [
        (-18.05, -26.19375, 15.875),
        (-11.7, -26.19375, 15.875),
        (7.35, -26.19375, 15.875),
        (13.7, -26.19375, 15.875),
    ]]
    fillet(fillet8_edges, radius=FILLET8_R)

    # Sketch14 → Cut-Extrude7 (cut, through all)
    with BuildSketch(Plane(origin=(0, -23.01875, 0), x_dir=(1, 0, 0), z_dir=(0, 1, 0))):
        with Locations((-21.225, -12.7)):
            Circle(SKETCH14_R)
        with Locations((-8.525, -12.7)):
            Circle(SKETCH14_R)
        with Locations((4.175, -12.7)):
            Circle(SKETCH14_R)
        with Locations((16.875, -12.7)):
            Circle(SKETCH14_R)
    extrude(amount=-CUT_EXTRUDE7_DEPTH, mode=Mode.SUBTRACT)

    # Fillet9
    fillet9_edges = [part.edges().sort_by_distance(p)[0] for p in [
        (-21.0265625, -26.19375, 12.7),
        (-21.084683498, -26.19375, 12.840316502),
        (-8.665316502, -26.19375, 12.840316502),
        (-8.7234375, -26.19375, 12.7),
        (4.3734375, -26.19375, 12.7),
        (4.315316502, -26.19375, 12.840316502),
        (16.734683498, -26.19375, 12.840316502),
        (16.6765625, -26.19375, 12.7),
    ]]
    fillet(fillet9_edges, radius=FILLET9_R)


solid = part.part
